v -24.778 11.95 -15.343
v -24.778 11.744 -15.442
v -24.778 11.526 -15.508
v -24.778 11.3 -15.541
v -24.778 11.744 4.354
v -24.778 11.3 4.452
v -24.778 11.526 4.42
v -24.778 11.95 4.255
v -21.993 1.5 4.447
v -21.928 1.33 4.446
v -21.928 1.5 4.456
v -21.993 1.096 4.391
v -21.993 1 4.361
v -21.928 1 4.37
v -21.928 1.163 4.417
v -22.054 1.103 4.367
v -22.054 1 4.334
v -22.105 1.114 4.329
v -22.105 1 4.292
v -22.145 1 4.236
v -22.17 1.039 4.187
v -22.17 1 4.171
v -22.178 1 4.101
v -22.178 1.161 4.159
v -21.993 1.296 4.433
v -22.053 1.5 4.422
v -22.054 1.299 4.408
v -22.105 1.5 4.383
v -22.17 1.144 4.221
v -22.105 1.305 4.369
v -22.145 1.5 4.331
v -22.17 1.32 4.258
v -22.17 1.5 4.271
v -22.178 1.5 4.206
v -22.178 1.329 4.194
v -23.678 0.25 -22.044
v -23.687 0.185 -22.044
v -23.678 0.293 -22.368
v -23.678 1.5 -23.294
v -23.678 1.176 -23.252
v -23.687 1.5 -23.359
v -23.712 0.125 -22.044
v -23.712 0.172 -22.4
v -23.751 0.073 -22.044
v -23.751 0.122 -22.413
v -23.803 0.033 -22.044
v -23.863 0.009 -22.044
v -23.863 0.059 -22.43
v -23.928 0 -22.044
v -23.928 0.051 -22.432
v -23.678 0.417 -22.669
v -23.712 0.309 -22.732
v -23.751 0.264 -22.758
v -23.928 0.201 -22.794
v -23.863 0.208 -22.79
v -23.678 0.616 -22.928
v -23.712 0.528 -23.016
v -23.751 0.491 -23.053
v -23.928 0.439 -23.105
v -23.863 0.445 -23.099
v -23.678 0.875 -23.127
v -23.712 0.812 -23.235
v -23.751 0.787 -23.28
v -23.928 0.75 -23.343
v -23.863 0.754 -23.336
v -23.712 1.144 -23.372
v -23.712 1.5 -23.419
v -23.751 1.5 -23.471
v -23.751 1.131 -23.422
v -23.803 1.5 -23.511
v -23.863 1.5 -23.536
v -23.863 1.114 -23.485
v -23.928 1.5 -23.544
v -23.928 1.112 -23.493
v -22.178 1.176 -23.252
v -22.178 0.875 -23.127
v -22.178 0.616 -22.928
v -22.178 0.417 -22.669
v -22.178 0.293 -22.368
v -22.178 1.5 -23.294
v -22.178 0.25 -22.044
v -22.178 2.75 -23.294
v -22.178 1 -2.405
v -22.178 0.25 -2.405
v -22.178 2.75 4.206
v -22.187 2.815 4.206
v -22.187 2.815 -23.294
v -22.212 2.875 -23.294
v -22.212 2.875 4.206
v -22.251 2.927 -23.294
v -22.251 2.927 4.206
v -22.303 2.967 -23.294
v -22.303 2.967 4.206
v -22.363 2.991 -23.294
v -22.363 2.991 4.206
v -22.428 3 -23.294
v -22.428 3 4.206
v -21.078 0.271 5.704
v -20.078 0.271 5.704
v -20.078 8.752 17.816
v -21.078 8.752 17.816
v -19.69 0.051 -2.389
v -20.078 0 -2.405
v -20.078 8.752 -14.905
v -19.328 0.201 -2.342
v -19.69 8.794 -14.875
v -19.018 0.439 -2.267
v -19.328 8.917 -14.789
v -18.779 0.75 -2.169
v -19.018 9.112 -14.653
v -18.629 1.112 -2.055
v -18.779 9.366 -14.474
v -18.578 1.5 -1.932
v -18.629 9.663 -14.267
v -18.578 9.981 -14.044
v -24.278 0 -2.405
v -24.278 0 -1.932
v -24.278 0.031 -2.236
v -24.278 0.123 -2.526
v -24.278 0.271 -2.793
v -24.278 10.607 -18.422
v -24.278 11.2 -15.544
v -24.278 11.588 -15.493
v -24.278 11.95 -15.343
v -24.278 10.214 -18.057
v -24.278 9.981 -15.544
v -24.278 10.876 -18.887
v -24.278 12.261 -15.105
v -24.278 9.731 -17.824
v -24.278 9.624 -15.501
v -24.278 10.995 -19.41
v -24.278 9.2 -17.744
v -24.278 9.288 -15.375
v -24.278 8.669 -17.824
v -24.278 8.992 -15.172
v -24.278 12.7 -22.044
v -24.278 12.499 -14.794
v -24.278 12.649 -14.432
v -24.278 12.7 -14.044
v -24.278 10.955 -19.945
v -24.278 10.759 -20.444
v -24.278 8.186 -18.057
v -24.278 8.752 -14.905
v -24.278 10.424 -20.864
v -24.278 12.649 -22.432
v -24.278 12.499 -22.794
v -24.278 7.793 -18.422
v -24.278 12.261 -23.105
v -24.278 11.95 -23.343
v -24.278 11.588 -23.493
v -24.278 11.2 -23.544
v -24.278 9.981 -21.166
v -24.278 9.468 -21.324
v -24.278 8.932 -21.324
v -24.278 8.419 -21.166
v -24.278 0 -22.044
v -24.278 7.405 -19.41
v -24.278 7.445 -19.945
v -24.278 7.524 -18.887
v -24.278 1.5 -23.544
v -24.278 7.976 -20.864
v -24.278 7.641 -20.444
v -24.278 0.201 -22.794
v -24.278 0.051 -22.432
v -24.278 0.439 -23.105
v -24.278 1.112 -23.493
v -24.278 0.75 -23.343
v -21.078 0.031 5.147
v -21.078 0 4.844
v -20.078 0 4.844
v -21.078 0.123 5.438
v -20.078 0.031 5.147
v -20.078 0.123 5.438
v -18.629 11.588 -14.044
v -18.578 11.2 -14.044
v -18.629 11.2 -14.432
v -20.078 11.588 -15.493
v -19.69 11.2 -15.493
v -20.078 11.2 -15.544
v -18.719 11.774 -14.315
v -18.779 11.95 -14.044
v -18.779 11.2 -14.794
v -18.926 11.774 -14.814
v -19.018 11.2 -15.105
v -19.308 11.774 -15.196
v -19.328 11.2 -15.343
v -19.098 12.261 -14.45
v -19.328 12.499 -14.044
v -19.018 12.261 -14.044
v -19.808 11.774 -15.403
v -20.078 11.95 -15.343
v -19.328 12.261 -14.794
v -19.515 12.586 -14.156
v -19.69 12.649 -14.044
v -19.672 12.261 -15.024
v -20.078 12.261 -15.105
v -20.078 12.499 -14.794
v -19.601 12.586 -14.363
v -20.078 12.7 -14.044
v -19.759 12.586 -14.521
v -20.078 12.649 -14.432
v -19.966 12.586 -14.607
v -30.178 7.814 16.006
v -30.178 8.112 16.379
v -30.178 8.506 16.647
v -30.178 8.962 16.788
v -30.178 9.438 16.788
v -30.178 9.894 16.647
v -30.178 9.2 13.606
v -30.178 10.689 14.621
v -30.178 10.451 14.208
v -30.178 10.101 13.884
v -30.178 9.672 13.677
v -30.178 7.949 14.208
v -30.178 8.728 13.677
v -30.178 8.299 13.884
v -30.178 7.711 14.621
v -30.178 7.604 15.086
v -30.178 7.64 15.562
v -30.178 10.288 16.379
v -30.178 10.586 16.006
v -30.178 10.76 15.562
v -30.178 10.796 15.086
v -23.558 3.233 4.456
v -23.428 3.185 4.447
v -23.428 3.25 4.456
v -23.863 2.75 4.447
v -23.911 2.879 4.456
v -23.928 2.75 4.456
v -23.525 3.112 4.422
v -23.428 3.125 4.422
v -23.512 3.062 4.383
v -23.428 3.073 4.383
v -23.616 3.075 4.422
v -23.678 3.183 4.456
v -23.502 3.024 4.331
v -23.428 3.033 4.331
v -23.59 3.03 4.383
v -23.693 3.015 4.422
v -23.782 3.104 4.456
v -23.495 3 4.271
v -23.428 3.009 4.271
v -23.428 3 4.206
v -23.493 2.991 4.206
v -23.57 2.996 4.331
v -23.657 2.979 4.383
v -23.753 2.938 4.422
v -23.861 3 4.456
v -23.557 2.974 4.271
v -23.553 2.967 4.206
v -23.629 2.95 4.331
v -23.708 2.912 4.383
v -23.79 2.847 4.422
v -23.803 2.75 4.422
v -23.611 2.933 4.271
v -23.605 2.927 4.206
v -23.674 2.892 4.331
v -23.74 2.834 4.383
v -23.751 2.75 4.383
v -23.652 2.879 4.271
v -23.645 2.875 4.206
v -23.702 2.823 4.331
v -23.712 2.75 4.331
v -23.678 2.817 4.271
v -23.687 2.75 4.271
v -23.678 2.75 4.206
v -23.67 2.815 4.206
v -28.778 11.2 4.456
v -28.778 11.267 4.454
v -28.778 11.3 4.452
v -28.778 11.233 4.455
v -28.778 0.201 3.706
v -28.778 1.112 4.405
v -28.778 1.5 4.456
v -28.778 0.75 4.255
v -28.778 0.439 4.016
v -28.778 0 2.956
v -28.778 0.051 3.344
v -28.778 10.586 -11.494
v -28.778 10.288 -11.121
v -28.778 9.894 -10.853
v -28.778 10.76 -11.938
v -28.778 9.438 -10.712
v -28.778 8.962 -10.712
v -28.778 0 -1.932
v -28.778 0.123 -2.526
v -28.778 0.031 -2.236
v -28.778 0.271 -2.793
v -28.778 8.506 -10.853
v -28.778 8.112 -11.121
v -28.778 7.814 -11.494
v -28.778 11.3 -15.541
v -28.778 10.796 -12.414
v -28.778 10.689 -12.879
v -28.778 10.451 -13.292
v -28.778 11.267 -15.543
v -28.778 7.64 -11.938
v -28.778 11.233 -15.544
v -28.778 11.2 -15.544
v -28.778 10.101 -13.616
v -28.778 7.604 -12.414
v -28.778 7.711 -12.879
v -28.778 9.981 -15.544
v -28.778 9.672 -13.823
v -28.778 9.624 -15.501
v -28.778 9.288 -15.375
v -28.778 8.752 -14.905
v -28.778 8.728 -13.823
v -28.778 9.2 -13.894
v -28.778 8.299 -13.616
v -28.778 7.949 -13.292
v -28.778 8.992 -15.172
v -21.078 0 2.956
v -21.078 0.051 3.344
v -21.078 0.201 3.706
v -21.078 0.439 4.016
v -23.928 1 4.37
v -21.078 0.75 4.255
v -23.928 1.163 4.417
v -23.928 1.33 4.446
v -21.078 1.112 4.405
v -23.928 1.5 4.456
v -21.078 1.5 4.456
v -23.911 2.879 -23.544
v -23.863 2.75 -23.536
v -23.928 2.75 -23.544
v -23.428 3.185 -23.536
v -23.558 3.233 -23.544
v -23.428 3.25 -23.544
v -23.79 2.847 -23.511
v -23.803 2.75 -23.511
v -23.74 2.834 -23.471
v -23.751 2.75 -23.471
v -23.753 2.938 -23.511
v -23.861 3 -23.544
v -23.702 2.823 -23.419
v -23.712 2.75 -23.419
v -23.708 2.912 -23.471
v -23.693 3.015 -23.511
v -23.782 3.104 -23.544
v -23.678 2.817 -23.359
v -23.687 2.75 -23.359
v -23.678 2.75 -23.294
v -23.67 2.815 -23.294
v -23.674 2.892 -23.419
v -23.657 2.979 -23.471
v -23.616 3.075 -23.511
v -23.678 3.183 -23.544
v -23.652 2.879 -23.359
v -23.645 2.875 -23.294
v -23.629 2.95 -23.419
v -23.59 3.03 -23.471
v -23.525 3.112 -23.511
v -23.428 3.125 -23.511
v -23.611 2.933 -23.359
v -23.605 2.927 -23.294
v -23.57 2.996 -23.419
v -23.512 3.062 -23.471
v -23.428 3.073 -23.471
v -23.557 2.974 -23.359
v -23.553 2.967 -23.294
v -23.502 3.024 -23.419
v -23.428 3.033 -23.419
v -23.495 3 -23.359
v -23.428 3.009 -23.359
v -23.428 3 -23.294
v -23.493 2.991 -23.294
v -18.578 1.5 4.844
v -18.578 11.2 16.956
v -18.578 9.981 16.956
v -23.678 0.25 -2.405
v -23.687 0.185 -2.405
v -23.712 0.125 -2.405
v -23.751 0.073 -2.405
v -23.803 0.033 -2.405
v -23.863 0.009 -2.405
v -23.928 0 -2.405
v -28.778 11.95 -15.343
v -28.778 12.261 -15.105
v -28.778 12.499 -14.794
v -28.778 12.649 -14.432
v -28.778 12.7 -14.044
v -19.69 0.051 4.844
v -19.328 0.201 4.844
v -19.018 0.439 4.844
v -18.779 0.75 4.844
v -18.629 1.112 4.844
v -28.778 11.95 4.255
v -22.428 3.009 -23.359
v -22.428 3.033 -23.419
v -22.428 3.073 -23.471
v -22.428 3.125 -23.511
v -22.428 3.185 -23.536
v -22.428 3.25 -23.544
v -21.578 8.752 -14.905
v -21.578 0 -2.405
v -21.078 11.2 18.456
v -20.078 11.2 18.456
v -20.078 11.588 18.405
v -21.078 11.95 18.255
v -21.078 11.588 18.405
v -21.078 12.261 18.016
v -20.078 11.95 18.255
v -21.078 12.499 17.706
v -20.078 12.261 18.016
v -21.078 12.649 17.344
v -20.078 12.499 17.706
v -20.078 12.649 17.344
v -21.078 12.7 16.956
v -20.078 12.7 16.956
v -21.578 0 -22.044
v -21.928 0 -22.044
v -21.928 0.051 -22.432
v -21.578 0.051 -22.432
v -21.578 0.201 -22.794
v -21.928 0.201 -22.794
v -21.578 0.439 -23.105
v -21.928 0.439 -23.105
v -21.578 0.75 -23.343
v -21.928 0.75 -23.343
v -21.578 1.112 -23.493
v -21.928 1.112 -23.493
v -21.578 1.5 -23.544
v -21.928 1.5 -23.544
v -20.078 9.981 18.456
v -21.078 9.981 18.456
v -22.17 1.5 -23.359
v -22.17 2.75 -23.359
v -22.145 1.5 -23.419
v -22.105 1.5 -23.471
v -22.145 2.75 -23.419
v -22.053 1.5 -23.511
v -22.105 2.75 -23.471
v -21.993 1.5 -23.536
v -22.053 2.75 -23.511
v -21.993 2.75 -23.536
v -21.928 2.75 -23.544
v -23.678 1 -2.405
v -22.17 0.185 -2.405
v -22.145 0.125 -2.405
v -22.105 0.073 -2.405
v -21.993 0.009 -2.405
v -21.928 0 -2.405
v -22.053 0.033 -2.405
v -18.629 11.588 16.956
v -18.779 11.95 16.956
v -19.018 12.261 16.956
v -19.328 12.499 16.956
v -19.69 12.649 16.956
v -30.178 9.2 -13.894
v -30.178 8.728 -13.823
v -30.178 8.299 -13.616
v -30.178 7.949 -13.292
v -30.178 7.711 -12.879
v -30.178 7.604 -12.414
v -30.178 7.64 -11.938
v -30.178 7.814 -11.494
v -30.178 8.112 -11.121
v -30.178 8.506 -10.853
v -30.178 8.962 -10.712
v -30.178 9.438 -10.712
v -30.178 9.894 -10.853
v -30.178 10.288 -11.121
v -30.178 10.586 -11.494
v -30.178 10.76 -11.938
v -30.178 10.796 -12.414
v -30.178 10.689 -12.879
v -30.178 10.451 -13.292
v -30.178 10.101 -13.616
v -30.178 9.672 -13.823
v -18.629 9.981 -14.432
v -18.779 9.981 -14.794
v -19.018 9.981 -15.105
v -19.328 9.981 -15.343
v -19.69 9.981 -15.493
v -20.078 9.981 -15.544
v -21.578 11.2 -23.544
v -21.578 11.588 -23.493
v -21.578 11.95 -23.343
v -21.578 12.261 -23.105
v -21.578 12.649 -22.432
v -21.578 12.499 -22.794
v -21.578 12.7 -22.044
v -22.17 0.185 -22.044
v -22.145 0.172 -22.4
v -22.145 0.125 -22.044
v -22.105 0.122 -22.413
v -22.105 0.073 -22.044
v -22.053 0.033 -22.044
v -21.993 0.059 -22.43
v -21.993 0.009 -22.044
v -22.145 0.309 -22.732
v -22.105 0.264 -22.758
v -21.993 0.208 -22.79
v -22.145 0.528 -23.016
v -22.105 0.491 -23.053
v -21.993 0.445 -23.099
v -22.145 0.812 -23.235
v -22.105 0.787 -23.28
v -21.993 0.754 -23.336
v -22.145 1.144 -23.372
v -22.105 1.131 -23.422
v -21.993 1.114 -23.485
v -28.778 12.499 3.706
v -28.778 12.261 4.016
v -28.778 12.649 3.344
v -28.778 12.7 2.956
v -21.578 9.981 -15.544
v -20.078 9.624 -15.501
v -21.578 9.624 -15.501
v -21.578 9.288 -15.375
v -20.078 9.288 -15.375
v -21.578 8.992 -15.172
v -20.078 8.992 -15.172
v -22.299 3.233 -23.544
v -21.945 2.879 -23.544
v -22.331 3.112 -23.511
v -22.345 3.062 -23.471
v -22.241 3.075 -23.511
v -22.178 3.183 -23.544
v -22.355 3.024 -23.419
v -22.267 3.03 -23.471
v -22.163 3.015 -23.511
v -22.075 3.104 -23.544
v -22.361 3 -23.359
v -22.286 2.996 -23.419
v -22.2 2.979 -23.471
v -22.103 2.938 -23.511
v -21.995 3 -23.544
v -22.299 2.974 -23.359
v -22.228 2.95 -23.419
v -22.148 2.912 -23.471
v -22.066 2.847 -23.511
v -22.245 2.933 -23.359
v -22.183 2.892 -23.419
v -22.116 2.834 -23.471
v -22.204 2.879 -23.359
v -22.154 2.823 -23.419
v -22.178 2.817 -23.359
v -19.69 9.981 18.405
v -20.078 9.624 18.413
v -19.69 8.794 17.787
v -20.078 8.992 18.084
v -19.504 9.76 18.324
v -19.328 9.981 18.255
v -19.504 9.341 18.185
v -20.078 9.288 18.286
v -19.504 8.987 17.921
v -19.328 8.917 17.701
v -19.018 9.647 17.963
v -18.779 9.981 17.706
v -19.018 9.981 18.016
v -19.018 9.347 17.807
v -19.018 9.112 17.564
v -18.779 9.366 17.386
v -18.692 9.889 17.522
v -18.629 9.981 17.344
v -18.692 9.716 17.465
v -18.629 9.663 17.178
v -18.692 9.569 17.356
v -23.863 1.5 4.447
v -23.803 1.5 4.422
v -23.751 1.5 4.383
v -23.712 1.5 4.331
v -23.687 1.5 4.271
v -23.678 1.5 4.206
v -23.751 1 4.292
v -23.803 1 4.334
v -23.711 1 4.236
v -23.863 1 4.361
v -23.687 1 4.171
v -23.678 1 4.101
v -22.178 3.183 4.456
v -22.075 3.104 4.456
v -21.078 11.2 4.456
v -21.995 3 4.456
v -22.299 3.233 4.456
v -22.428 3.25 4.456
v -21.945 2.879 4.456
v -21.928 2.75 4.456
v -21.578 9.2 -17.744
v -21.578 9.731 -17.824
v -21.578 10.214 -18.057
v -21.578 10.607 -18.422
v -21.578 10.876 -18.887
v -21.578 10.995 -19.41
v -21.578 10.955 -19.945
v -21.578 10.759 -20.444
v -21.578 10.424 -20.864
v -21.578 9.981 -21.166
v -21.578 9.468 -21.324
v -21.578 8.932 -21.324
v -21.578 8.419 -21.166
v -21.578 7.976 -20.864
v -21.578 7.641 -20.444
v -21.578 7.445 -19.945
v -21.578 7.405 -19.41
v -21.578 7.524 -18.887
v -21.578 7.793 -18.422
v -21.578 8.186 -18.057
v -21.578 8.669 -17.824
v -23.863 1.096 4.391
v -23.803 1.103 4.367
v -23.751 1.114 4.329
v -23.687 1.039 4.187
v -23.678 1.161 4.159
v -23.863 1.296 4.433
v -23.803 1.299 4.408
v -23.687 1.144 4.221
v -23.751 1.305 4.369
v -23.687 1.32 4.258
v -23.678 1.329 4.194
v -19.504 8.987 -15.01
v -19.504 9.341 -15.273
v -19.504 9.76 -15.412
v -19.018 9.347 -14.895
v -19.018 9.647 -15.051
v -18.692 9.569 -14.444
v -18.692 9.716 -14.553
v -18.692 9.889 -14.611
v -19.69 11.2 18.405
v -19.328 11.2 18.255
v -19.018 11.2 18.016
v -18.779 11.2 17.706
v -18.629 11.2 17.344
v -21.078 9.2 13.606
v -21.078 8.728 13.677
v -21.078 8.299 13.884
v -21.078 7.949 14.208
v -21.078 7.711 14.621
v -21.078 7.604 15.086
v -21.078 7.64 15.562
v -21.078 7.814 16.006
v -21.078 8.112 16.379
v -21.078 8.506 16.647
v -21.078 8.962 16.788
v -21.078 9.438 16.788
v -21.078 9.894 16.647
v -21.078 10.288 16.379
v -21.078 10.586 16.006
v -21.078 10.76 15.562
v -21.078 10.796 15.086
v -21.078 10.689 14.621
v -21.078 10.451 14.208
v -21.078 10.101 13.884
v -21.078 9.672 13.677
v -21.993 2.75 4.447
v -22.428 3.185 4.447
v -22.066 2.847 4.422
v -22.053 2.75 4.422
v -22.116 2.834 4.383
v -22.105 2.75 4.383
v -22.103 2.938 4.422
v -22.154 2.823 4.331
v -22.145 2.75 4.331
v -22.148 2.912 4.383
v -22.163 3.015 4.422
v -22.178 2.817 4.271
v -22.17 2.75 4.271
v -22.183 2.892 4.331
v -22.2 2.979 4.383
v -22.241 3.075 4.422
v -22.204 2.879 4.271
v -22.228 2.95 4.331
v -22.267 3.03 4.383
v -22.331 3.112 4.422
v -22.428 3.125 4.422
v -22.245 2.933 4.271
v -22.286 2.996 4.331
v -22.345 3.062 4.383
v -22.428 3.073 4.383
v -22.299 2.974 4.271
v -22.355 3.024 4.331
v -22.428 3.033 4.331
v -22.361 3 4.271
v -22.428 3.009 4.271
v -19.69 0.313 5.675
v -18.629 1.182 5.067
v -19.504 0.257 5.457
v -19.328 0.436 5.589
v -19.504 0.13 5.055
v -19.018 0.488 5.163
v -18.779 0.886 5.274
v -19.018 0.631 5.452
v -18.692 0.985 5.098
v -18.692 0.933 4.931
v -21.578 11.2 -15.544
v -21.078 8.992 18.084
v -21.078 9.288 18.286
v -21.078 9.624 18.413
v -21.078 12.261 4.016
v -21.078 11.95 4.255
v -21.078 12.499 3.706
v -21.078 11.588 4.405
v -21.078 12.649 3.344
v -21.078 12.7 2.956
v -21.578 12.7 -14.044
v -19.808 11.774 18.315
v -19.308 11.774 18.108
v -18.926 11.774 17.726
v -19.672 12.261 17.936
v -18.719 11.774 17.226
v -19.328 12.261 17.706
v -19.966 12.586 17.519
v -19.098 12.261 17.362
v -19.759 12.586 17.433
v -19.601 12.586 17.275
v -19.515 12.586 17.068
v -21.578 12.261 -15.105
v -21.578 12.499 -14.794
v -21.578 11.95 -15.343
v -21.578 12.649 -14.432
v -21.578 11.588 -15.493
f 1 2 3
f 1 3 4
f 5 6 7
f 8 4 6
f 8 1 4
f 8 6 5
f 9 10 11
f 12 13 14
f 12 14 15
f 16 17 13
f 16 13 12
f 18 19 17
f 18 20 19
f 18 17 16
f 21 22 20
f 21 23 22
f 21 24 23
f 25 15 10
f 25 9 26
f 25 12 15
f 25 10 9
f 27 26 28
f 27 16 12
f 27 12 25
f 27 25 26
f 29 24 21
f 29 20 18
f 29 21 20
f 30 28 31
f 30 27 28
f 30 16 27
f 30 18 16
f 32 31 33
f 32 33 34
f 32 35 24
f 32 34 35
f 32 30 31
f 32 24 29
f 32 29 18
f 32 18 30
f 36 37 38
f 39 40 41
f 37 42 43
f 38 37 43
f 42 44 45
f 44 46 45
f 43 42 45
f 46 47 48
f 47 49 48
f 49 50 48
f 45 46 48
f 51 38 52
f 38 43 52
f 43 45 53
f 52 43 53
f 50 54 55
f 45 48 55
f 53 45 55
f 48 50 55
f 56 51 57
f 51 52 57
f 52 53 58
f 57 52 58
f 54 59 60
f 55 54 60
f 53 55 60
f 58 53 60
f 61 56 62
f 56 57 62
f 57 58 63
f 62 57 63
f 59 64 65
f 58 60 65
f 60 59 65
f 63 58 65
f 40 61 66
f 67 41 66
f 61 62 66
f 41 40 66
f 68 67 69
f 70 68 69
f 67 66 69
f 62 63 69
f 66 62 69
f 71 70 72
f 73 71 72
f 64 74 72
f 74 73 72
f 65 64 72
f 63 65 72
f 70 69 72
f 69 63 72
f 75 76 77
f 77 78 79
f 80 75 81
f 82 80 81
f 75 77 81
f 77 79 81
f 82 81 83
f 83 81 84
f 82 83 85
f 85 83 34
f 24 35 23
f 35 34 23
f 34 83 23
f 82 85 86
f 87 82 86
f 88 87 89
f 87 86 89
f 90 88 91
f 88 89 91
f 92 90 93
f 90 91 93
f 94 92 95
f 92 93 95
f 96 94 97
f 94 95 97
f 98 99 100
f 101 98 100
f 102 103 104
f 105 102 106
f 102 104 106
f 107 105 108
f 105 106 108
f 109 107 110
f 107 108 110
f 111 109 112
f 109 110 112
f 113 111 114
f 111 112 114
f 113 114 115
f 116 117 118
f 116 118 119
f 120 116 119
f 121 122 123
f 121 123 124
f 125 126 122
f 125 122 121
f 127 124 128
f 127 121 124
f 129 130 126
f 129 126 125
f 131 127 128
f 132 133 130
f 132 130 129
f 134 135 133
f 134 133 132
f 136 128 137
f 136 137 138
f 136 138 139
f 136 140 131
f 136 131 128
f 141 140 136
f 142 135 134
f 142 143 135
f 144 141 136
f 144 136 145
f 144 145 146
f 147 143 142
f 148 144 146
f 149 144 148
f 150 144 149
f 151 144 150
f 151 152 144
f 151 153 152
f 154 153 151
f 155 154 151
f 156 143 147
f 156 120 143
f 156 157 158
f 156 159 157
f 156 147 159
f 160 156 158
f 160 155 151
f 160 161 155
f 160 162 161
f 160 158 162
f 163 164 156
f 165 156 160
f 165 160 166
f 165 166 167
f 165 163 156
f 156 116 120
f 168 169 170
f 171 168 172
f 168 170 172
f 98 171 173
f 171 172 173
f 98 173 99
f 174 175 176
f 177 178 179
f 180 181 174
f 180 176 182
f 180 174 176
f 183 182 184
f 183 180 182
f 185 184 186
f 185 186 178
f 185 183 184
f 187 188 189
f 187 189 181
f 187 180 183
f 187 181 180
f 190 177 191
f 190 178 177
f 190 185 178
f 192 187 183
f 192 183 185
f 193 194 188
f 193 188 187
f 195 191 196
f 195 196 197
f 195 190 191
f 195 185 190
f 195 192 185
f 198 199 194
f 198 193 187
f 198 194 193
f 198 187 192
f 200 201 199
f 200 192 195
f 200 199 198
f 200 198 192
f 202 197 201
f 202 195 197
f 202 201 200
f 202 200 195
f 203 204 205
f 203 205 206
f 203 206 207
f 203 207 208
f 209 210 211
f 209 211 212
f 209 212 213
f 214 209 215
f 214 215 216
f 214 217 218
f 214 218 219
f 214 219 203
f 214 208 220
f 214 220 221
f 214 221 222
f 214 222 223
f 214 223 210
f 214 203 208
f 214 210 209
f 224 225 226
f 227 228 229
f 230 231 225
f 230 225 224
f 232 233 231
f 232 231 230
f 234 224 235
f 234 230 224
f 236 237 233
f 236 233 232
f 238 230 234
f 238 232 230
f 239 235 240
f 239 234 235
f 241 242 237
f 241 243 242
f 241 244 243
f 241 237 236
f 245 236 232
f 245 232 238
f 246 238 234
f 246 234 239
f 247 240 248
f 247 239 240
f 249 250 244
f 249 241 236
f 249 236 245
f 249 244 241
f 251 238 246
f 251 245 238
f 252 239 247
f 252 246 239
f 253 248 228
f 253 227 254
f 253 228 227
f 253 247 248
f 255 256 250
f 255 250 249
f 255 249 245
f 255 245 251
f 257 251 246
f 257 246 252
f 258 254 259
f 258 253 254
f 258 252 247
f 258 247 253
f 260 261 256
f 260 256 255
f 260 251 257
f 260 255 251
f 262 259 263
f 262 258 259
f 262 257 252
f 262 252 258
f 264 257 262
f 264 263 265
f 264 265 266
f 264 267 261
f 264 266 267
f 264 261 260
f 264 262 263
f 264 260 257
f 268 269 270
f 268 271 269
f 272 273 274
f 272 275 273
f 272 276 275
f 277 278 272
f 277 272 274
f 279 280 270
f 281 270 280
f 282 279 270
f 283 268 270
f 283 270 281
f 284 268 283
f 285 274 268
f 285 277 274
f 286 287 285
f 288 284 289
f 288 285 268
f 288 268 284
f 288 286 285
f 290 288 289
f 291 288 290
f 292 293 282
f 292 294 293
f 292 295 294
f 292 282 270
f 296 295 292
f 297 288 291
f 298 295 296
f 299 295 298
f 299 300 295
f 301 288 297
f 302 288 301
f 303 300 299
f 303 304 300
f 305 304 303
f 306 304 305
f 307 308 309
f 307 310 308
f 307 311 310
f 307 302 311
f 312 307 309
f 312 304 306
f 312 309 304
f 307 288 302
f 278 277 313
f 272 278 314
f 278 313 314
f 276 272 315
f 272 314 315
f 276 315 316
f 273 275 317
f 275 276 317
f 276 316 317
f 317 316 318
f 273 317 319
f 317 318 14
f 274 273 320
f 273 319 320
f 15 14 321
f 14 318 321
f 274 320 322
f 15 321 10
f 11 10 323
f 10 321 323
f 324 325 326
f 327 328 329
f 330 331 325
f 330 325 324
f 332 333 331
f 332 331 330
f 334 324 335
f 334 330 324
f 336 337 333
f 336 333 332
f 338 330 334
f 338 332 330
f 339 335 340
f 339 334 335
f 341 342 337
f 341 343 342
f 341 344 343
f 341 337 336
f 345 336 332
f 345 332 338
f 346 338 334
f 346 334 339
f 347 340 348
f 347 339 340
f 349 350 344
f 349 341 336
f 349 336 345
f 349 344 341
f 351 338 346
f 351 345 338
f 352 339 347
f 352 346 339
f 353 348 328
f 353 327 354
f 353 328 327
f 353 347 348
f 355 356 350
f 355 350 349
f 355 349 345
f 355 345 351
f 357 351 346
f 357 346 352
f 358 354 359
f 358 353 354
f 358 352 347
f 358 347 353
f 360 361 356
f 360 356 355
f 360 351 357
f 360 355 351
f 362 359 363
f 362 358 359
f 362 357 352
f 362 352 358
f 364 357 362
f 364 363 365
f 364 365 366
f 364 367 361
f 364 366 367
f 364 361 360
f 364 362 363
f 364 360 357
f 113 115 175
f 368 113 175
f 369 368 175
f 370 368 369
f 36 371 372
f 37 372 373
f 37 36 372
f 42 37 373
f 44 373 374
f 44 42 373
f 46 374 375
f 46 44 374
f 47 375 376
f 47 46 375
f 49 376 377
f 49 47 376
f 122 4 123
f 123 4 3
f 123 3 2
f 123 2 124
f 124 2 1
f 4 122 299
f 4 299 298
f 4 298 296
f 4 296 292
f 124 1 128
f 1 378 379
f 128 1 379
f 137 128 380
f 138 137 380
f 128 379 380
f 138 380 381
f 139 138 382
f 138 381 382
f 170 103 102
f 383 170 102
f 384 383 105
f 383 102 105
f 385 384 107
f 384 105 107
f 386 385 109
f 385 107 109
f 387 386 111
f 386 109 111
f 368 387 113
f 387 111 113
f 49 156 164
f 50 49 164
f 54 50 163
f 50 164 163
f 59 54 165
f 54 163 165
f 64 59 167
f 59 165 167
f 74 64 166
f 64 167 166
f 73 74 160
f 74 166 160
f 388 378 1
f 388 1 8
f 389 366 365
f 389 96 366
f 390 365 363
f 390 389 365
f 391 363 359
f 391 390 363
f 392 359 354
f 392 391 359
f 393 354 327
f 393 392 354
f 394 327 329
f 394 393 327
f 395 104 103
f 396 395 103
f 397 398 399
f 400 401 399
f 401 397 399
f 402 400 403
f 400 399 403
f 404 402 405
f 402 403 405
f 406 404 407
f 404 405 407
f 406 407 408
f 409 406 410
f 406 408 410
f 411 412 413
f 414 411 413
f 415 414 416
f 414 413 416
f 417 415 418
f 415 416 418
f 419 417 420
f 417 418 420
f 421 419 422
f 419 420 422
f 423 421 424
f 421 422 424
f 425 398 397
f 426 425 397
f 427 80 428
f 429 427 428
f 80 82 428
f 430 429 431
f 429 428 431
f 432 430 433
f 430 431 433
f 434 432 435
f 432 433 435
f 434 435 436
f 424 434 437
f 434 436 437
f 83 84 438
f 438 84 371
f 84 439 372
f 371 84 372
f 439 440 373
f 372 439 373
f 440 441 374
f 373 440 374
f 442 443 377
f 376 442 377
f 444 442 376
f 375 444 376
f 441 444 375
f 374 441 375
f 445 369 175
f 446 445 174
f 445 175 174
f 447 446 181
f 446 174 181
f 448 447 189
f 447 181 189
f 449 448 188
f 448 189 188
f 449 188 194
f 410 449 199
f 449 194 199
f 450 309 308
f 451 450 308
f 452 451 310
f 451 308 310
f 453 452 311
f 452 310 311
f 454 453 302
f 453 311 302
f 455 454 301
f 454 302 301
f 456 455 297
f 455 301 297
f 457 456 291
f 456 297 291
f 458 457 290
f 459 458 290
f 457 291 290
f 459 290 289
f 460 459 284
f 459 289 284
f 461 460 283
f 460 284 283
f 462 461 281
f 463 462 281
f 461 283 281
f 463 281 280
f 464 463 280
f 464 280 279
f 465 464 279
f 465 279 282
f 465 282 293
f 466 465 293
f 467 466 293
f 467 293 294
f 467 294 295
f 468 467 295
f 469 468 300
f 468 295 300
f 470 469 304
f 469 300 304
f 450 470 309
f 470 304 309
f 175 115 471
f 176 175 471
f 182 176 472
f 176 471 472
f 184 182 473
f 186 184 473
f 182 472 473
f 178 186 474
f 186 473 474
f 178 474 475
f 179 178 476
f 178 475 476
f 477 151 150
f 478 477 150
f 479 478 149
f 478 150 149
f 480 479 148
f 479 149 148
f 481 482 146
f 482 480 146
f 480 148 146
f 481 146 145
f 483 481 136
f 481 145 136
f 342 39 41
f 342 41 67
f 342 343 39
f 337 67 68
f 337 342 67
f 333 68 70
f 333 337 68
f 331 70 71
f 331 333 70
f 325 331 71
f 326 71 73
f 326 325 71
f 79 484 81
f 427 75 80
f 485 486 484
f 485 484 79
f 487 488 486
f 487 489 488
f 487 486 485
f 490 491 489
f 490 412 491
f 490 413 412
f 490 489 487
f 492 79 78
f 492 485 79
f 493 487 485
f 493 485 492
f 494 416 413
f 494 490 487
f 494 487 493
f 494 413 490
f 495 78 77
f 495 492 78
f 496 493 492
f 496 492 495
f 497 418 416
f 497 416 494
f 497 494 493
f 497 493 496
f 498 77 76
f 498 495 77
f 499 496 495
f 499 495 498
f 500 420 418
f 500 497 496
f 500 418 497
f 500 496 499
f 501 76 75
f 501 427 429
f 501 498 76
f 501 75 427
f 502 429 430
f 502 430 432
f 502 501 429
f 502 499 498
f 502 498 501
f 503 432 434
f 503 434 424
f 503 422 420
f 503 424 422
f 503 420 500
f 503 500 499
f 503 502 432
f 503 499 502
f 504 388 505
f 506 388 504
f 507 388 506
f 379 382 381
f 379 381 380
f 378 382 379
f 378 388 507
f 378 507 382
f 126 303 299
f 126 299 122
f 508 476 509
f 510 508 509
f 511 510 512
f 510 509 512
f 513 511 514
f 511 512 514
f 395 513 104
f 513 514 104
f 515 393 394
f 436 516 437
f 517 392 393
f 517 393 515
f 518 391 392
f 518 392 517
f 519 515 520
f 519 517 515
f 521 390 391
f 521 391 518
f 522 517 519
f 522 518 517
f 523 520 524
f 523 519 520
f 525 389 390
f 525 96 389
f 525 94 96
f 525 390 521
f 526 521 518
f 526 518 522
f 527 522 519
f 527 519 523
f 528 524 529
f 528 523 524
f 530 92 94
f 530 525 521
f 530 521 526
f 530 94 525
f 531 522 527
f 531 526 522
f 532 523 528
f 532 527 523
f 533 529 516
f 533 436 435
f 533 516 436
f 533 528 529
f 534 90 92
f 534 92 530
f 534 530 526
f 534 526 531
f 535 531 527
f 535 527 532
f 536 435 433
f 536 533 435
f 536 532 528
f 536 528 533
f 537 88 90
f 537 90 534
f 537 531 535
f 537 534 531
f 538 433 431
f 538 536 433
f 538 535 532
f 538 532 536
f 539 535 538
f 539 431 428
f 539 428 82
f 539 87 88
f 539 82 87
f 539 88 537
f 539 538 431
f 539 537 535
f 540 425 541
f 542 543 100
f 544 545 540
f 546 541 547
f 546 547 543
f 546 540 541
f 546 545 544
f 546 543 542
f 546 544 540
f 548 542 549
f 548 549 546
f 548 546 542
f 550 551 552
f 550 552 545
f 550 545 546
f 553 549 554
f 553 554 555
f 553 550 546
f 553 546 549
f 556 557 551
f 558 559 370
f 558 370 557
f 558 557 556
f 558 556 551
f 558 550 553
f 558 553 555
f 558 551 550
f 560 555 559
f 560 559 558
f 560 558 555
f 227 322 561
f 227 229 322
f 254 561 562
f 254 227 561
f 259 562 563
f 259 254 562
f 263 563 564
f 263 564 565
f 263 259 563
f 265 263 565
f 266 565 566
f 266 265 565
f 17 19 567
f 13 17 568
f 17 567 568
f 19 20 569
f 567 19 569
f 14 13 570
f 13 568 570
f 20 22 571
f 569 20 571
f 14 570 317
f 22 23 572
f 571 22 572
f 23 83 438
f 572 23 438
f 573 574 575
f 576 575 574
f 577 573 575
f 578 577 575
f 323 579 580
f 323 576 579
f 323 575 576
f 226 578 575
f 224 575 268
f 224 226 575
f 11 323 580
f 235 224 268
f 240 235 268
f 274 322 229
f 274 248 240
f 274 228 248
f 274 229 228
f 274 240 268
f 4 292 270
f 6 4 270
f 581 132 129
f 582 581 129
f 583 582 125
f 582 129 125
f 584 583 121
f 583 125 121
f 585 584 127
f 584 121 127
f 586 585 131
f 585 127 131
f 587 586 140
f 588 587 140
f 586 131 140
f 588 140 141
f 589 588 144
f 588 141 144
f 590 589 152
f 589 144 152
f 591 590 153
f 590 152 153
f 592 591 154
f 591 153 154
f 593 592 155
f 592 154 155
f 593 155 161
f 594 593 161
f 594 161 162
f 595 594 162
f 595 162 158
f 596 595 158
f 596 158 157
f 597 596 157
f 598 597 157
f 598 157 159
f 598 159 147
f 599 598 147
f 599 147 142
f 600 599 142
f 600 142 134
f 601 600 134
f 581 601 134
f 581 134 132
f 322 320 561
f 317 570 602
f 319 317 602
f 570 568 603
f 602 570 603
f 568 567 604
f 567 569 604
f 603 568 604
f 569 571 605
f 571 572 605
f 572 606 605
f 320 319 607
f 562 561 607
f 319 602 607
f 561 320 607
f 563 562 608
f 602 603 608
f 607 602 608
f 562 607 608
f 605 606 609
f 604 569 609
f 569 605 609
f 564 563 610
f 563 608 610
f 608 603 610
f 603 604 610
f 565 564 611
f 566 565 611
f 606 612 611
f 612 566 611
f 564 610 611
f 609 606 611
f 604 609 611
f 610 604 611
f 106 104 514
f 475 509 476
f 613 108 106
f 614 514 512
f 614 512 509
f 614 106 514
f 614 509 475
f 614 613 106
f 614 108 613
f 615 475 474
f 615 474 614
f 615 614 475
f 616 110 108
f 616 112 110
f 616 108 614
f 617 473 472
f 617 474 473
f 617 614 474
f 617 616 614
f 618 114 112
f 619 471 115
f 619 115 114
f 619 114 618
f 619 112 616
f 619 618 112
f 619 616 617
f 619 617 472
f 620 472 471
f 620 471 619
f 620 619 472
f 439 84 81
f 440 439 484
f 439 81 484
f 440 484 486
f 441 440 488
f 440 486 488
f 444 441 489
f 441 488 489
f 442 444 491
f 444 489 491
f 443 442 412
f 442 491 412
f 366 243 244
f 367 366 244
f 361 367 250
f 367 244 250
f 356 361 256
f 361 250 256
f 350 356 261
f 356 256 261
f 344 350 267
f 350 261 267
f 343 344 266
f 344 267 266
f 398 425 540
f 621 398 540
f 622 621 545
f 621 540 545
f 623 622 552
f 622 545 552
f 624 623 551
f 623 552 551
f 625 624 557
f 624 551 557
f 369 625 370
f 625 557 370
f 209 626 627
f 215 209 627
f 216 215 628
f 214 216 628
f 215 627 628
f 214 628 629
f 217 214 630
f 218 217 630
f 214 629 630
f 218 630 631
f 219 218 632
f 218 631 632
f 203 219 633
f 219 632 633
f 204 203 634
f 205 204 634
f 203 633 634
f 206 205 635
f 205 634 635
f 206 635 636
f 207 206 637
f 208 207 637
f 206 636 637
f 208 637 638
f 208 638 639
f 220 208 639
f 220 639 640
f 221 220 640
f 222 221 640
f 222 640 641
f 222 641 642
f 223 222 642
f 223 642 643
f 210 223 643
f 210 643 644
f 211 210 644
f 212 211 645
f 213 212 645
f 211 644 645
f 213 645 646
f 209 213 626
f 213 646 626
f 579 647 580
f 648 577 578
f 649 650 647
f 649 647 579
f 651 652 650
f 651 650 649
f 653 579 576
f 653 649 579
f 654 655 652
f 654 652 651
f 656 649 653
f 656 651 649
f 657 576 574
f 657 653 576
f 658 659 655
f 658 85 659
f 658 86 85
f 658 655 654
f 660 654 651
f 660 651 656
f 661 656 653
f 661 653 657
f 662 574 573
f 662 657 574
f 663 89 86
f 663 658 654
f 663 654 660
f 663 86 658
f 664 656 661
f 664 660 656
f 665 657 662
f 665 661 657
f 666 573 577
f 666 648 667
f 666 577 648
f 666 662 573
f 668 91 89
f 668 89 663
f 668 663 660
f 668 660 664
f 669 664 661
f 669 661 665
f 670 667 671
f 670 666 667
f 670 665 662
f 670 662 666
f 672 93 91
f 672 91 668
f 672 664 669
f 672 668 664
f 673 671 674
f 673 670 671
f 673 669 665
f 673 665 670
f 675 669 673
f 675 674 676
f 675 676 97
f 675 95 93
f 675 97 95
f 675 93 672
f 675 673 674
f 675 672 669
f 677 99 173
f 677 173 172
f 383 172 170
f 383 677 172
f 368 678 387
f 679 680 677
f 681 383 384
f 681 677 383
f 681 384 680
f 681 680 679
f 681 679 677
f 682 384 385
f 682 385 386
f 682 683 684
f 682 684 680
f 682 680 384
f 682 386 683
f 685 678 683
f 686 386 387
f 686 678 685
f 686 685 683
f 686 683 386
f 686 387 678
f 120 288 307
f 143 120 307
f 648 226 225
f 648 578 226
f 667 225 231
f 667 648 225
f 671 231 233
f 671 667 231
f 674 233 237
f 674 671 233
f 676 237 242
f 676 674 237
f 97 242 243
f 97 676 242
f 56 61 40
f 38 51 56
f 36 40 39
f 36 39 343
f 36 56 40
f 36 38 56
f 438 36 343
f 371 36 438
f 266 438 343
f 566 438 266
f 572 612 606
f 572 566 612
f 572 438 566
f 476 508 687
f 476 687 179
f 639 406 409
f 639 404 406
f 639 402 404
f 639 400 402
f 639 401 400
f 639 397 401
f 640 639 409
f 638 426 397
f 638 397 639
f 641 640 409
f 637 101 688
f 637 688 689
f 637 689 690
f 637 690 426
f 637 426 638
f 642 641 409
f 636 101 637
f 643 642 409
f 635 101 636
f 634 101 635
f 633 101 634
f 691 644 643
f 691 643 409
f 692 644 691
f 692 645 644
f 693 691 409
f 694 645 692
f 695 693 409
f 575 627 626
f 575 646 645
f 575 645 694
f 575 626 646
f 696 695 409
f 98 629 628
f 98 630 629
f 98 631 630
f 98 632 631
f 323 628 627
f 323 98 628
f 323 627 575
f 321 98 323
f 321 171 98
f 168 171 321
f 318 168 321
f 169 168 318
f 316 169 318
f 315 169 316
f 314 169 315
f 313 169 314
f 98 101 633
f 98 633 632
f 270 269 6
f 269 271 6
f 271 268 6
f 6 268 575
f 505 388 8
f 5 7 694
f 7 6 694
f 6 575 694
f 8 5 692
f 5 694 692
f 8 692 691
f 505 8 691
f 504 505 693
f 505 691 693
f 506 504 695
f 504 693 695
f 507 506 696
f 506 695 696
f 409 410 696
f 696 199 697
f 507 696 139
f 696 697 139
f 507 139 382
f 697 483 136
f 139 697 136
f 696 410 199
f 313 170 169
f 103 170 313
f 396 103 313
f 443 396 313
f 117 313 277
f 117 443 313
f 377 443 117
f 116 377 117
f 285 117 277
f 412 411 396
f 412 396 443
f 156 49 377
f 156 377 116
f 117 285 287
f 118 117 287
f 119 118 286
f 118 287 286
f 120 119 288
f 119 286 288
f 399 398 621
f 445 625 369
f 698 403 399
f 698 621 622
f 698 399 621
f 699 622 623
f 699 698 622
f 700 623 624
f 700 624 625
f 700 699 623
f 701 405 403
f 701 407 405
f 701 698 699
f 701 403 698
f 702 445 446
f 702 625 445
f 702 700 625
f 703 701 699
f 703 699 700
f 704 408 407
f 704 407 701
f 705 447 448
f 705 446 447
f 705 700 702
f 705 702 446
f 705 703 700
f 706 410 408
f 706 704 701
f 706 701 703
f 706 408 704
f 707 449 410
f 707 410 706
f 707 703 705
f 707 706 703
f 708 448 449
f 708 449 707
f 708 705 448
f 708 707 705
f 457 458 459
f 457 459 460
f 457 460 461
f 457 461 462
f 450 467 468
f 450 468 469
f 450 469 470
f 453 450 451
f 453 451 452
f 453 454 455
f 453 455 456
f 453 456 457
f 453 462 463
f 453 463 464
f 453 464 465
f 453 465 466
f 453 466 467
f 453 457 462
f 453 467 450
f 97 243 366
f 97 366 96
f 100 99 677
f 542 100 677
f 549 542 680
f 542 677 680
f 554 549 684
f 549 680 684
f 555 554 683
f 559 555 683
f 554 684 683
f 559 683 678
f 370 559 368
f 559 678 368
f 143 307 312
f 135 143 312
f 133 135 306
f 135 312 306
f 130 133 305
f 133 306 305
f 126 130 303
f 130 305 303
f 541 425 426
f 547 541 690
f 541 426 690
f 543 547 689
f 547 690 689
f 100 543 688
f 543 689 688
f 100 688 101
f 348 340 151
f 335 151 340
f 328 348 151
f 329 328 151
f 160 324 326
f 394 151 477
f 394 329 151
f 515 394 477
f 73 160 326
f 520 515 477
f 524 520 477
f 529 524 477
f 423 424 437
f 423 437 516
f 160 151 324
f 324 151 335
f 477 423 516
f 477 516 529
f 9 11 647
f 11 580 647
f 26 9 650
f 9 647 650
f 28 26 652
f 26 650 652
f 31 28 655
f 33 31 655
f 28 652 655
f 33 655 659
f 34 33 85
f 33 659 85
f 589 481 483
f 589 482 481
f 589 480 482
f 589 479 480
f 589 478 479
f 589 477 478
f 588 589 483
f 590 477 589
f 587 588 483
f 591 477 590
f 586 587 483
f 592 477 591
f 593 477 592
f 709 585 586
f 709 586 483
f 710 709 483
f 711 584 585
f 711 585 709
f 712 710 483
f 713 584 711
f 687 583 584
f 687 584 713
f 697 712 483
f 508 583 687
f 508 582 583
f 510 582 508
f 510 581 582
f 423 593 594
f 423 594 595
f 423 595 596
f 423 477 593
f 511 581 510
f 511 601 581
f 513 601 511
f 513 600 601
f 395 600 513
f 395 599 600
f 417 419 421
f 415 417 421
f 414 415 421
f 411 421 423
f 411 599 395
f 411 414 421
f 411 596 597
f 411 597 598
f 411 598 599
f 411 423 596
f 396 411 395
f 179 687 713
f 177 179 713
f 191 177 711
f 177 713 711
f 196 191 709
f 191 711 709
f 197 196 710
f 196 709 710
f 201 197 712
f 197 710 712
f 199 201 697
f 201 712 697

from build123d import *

# Parameters (mm, degrees)
BOSS_EXTRUDE1_DEPTH = 12.7
CUT_EXTRUDE2_DEPTH  = 4.5
CUT_EXTRUDE3_DEPTH  = 29.629690424
BOSS_EXTRUDE2_START = -7.7
SKETCH2_5_R         = 1.6
BOSS_EXTRUDE2_DEPTH = 9.1
SKETCH2_6_R         = 1.8
CUT_EXTRUDE4_DEPTH  = 29.629690424
SKETCH2_7_R         = 1.6
BOSS_EXTRUDE3_DEPTH = 1.4
SKETCH2_8_W         = 42
SKETCH2_8_H         = 0.65
CUT_EXTRUDE5_DEPTH  = 4
CUT_EXTRUDE6_REACH  = 31.158
SKETCH4_W           = 1.5
SKETCH4_H           = 28
CUT_EXTRUDE7_DEPTH  = 3
SKETCH6_W           = 2.1
SKETCH6_H           = 6.861038338
BOSS_EXTRUDE4_DEPTH = 1
CUT_EXTRUDE8_DEPTH  = 4.5
FILLET1_R           = 1.5
FILLET2_R           = 0.25


with BuildPart() as part:
    # Sketch1 → Boss-Extrude1 (new body)
    with BuildSketch(Plane(origin=(0, 0, 0), x_dir=(1, 0, 0), z_dir=(0, 1, 0))):
        Polygon((-28.77817965, 15.54419618), (-24.27817965, 15.54419618), (-24.27817965, 23.54419618), (-21.57817965, 23.54419618), (-21.57817965, 15.54419618), (-18.57817965, 15.54419618), (-18.57817965, -18.45580382), (-21.07817965, -18.45580382), (-21.07817965, -4.45580382), (-28.77817965, -4.45580382), align=None)
    extrude(amount=BOSS_EXTRUDE1_DEPTH)

    # Sketch2 → Cut-Extrude2 (cut)
    with BuildSketch(Plane.ZY.offset(28.77817965)):
        Polygon((-15.54419618, 5.764870839), (-15.54419618, 0), (-7.040359819, 0), align=None)
    extrude(amount=-CUT_EXTRUDE2_DEPTH, mode=Mode.SUBTRACT)

    # Sketch2<4> → Cut-Extrude3 (cut, through all)
    with BuildSketch(Plane.ZY.offset(28.77817965)):
        Polygon((12.124702683, 0), (18.45580382, 0), (18.45580382, 9.2), align=None)
    extrude(amount=-CUT_EXTRUDE3_DEPTH, mode=Mode.SUBTRACT)

    # Sketch2<5> → Boss-Extrude2 (add)
    with BuildSketch(Plane.ZY.offset(28.77817965).offset(BOSS_EXTRUDE2_START)):
        with Locations(Location((15.20580382, 9.2, 0), (0, 0, 180))):
            Circle(SKETCH2_5_R)
    extrude(amount=BOSS_EXTRUDE2_DEPTH)

    # Sketch2<6> → Cut-Extrude4 (cut, through all)
    with BuildSketch(Plane.ZY.offset(28.77817965)):
        with Locations((-19.54419618, 9.2)):
            Circle(SKETCH2_6_R)
    extrude(amount=-CUT_EXTRUDE4_DEPTH, mode=Mode.SUBTRACT)

    # Sketch2<7> → Boss-Extrude3 (add)
    with BuildSketch(Plane.ZY.offset(28.77817965)):
        with Locations(Location((-12.29419618, 9.2, 0), (0, 0, 180))):
            Circle(SKETCH2_7_R)
    extrude(amount=BOSS_EXTRUDE3_DEPTH)

    # Sketch2<8> → Cut-Extrude5 (cut)
    with BuildSketch(Plane.ZY.offset(28.77817965)):
        with Locations((-2.54419618, 11.625)):
            Rectangle(SKETCH2_8_W, SKETCH2_8_H)
    extrude(amount=-CUT_EXTRUDE5_DEPTH, mode=Mode.SUBTRACT)

    # Cut-Extrude6: up to this face of the body (flat: up to its plane)
    cut_extrude6_end = Plane(part.part.faces().sort_by_distance((-21.57817965, 6.032683514, -19.54419618))[0])
    # Sketch3 → Cut-Extrude6 (cut, up to the picked face)
    with BuildSketch(Plane(origin=(-18.57817965, 0, 0), x_dir=(0, 0, -1), z_dir=(1, 0, 0)), mode=Mode.PRIVATE) as cut_extrude6_sk1:
        Polygon((15.54419618, 0), (15.54419618, 9.2), (2.405234518, 0), align=None)
    cut_extrude6_tool1 = split(extrude(cut_extrude6_sk1.sketch, amount=-CUT_EXTRUDE6_REACH, mode=Mode.PRIVATE), bisect_by=cut_extrude6_end, keep=Keep.BOTH, mode=Mode.PRIVATE)
    # Sketch3 → Cut-Extrude6 (cut, up to the picked face)
    with BuildSketch(Plane(origin=(-18.57817965, 0, 0), x_dir=(0, 0, -1), z_dir=(1, 0, 0)), mode=Mode.PRIVATE) as cut_extrude6_sk2:
        Polygon((-12.124702683, 0), (-18.45580382, 9.2), (-18.45580382, 0), align=None)
    cut_extrude6_tool2 = split(extrude(cut_extrude6_sk2.sketch, amount=-CUT_EXTRUDE6_REACH, mode=Mode.PRIVATE), bisect_by=cut_extrude6_end, keep=Keep.BOTH, mode=Mode.PRIVATE)
    # Sketch3 → Cut-Extrude6 (cut, up to the picked face)
    with BuildSketch(Plane(origin=(-18.57817965, 0, 0), x_dir=(0, 0, -1), z_dir=(1, 0, 0)), mode=Mode.PRIVATE) as cut_extrude6_sk3:
        Polygon((-5.316842158, 0), (-18.45580382, 9.2), (-12.124702683, 0), align=None)
    cut_extrude6_tool3 = split(extrude(cut_extrude6_sk3.sketch, amount=-CUT_EXTRUDE6_REACH, mode=Mode.PRIVATE), bisect_by=cut_extrude6_end, keep=Keep.BOTH, mode=Mode.PRIVATE)
    add(cut_extrude6_tool1.solids().sort_by(Axis((-18.57818, 3.066667, -11.164542), (-1, 0, 0)))[0], mode=Mode.SUBTRACT)
    add(cut_extrude6_tool2.solids().sort_by(Axis((-18.57818, 3.066667, 16.345437), (-1, 0, 0)))[0], mode=Mode.SUBTRACT)
    add(cut_extrude6_tool3.solids().sort_by(Axis((-18.57818, 3.066667, 11.965783), (-1, 0, 0)))[0], mode=Mode.SUBTRACT)

    # Sketch4 → Cut-Extrude7 (cut)
    with BuildSketch(Plane.XZ):
        with Locations((-22.92817965, -9.54419618)):
            Rectangle(SKETCH4_W, SKETCH4_H)
    extrude(amount=-CUT_EXTRUDE7_DEPTH, mode=Mode.SUBTRACT)

    # Sketch6 → Boss-Extrude4 (add)
    with BuildSketch(Plane(origin=(0, 0, 0), x_dir=(-1, 0, 0), z_dir=(0, -1, 0))):
        with Locations((22.62817965, -1.025284651)):
            Rectangle(SKETCH6_W, SKETCH6_H)
    extrude(amount=-BOSS_EXTRUDE4_DEPTH)

    # Sketch8 → Cut-Extrude8 (cut)
    with BuildSketch(Plane.ZY.offset(28.77817965)):
        Polygon((-15.54419618, 0), (-7.040359819, 0), (-15.54419618, 5.764870839), align=None)
        Polygon((-7.040359819, 0), (-2.405234518, 0), (-15.54419618, 9.2), (-15.54419618, 5.764870839), align=None)
    extrude(amount=-CUT_EXTRUDE8_DEPTH, mode=Mode.SUBTRACT)

    # Fillet1
    # the kernel refuses this fillet: 1.5 mm, written as the material it takes off along each edge
    with BuildSketch(Plane(origin=(-20.07817965, 9.980850576, 16.95580382), x_dir=(0, 0, 1), z_dir=(1, 0, 0))) as fillet1_piece_1_section:
        Polygon((0, 0), (FILLET1_R, 0), (FILLET1_R, FILLET1_R * 0.520567050552), (FILLET1_R * 0.573576436351, FILLET1_R * 0.819152044289), align=None)
    fillet1_piece_1 = extrude(amount=FILLET1_R, mode=Mode.PRIVATE)
    fillet1_piece_1 = fillet1_piece_1 - Plane(origin=(-20.07817965, 9.980850576, 16.95580382), x_dir=(0, 0.46174861323503175, -0.8870108331782229), z_dir=(1, 0, 0)) * Sphere(FILLET1_R, mode=Mode.PRIVATE)
    add(fillet1_piece_1, mode=Mode.SUBTRACT)
    with BuildSketch(Plane(origin=(-20.07817965, 11.2, 16.95580382), x_dir=(1, 0, 0), z_dir=(0, 1, 0))) as fillet1_piece_2_section:
        Polygon((0, 0), (FILLET1_R, 0), (FILLET1_R, -FILLET1_R), (0, -FILLET1_R), align=None)
    fillet1_piece_2 = extrude(amount=FILLET1_R, mode=Mode.PRIVATE)
    fillet1_piece_2 = fillet1_piece_2 - Plane(origin=(-20.07817965, 11.2, 16.95580382), x_dir=(-0.7071067811865476, 0, -0.7071067811865474), z_dir=(0, 1, 0)) * Sphere(FILLET1_R, mode=Mode.PRIVATE)
    add(fillet1_piece_2, mode=Mode.SUBTRACT)
    with BuildSketch(Plane(origin=(-20.07817965, 1.5, 4.843893974), x_dir=(0, -0.8191520442889889, 0.5735764363510503), z_dir=(1, 0, 0))) as fillet1_piece_3_section:
        Polygon((0, 0), (FILLET1_R, 0), (FILLET1_R, FILLET1_R * 0.315298788879), (FILLET1_R * 0.819152044289, FILLET1_R * 0.573576436351), align=None)
    fillet1_piece_3 = extrude(amount=FILLET1_R, mode=Mode.PRIVATE)
    fillet1_piece_3 = fillet1_piece_3 - Plane(origin=(-20.07817965, 1.5, 4.843893974), x_dir=(0, 0.9537169507482263, -0.30070579950427556), z_dir=(1, 0, 0)) * Sphere(FILLET1_R, mode=Mode.PRIVATE)
    add(fillet1_piece_3, mode=Mode.SUBTRACT)
    with BuildSketch(Plane(origin=(-20.07817965, 9.980850576, -14.04419618), x_dir=(0, 0, -1), z_dir=(1, 0, 0))) as fillet1_piece_4_section:
        Polygon((0, 0), (FILLET1_R, 0), (FILLET1_R, -FILLET1_R * 0.520567050552), (FILLET1_R * 0.573576436351, -FILLET1_R * 0.819152044289), align=None)
    fillet1_piece_4 = extrude(amount=FILLET1_R, mode=Mode.PRIVATE)
    fillet1_piece_4 = fillet1_piece_4 - Plane(origin=(-20.07817965, 9.980850576, -14.04419618), x_dir=(0, 0.4617486132350316, 0.8870108331782229), z_dir=(1, 0, 0)) * Sphere(FILLET1_R, mode=Mode.PRIVATE)
    add(fillet1_piece_4, mode=Mode.SUBTRACT)
    with BuildSketch(Plane(origin=(-20.07817965, 11.2, -14.04419618), x_dir=(1, 0, 0), z_dir=(0, 1, 0))) as fillet1_piece_5_section:
        Polygon((0, 0), (FILLET1_R, 0), (FILLET1_R, FILLET1_R), (0, FILLET1_R), align=None)
    fillet1_piece_5 = extrude(amount=FILLET1_R, mode=Mode.PRIVATE)
    fillet1_piece_5 = fillet1_piece_5 - Plane(origin=(-20.07817965, 11.2, -14.04419618), x_dir=(-0.7071067811865475, 0, 0.7071067811865477), z_dir=(0, 1, 0)) * Sphere(FILLET1_R, mode=Mode.PRIVATE)
    add(fillet1_piece_5, mode=Mode.SUBTRACT)
    with BuildSketch(Plane(origin=(-21.07817965, 0, 4.45580382), x_dir=(0, 1, 0), z_dir=(-1, 0, 0))) as fillet1_piece_6:
        with BuildLine():
            CenterArc((FILLET1_R, FILLET1_R), FILLET1_R, 180, 90)
            Line((0, FILLET1_R), (0, 0))
            Line((0, 0), (FILLET1_R, 0))
        make_face()
    extrude(amount=11.45, mode=Mode.SUBTRACT)
    with BuildSketch(Plane(origin=(-21.07817965, 12.7, 4.45580382), x_dir=(0, -1, 0), z_dir=(-1, 0, 0))) as fillet1_piece_7:
        with BuildLine():
            CenterArc((FILLET1_R, -FILLET1_R), FILLET1_R, 90, 90)
            Line((0, -FILLET1_R), (0, 0))
            Line((0, 0), (FILLET1_R, 0))
        make_face()
    extrude(amount=11.45, mode=Mode.SUBTRACT)
    with BuildSketch(Plane(origin=(-25.92817965, 0, -23.54419618), x_dir=(0, 1, 0), z_dir=(1, 0, 0)), Plane(origin=(-28.02817965, 0, -23.54419618), x_dir=(0, 1, 0), z_dir=(1, 0, 0))) as fillet1_piece_8:
        with BuildLine():
            CenterArc((FILLET1_R, FILLET1_R), FILLET1_R, 180, 90)
            Line((0, FILLET1_R), (0, 0))
            Line((0, 0), (FILLET1_R, 0))
        make_face()
    extrude(amount=8.1, mode=Mode.SUBTRACT)
    with BuildSketch(Plane(origin=(-28.02817965, 12.7, -23.54419618), x_dir=(0, -1, 0), z_dir=(1, 0, 0))) as fillet1_piece_9:
        with BuildLine():
            CenterArc((FILLET1_R, -FILLET1_R), FILLET1_R, 90, 90)
            Line((0, -FILLET1_R), (0, 0))
            Line((0, 0), (FILLET1_R, 0))
        make_face()
    extrude(amount=10.2, mode=Mode.SUBTRACT)
    with BuildSketch(Plane(origin=(-18.57817965, 9.980850576, 18.45580382), x_dir=(0, 0, -1), z_dir=(0, 1, 0))) as fillet1_piece_10:
        with BuildLine():
            CenterArc((FILLET1_R, FILLET1_R), FILLET1_R, 180, 90)
            Line((0, FILLET1_R), (0, 0))
            Line((0, 0), (FILLET1_R, 0))
        make_face()
    extrude(amount=1.219149424, mode=Mode.SUBTRACT)
    with BuildSketch(Plane(origin=(-23.03030609, 9.2, 18.45580382), x_dir=(0, 1, 0), z_dir=(1, 0, 0))) as fillet1_piece_11:
        with BuildLine():
            CenterArc((FILLET1_R * 0.520567050552, -FILLET1_R), FILLET1_R, 90, 55)
            Line((-FILLET1_R * 0.298584993737, -FILLET1_R * 0.426423563649), (0, 0))
            Line((0, 0), (FILLET1_R * 0.520567050552, 0))
        make_face()
    extrude(amount=2.95212644, mode=Mode.SUBTRACT)
    with BuildSketch(Plane(origin=(-20.07817965, 12.7, 18.45580382), x_dir=(0, -1, 0), z_dir=(-1, 0, 0))) as fillet1_piece_12:
        with BuildLine():
            CenterArc((FILLET1_R, -FILLET1_R), FILLET1_R, 90, 90)
            Line((0, -FILLET1_R), (0, 0))
            Line((0, 0), (FILLET1_R, 0))
        make_face()
    extrude(amount=4.75, mode=Mode.SUBTRACT)
    with BuildSketch(Plane(origin=(-20.07817965, 0, 5.316842158), x_dir=(0, 0.573576436351042, 0.8191520442889947), z_dir=(-1, 0, 0))) as fillet1_piece_13:
        with BuildLine():
            CenterArc((FILLET1_R * 0.315298788879, FILLET1_R), FILLET1_R, 235, 35)
            Line((-FILLET1_R * 0.258277647472, FILLET1_R * 0.180847955711), (0, 0))
            Line((0, 0), (FILLET1_R * 0.315298788879, 0))
        make_face()
    extrude(amount=2.182370458, mode=Mode.SUBTRACT)
    with BuildSketch(Plane(origin=(-18.57817965, 0.271271934, 5.704258629), x_dir=(2.3684757858670013e-15, 0.8191520442889889, -0.5735764363510503), z_dir=(0, 0.5735764363510503, 0.8191520442889889))) as fillet1_piece_14:
        with BuildLine():
            CenterArc((FILLET1_R, FILLET1_R), FILLET1_R, 180, 90)
            Line((0, FILLET1_R), (0, 0))
            Line((0, 0), (FILLET1_R, 0))
        make_face()
    extrude(amount=14.785911761, mode=Mode.SUBTRACT)
    with BuildSketch(Plane(origin=(-18.57817965, 0, -6.155234518), x_dir=(0, 1, 0), z_dir=(0, 0, 1))) as fillet1_piece_15:
        with BuildLine():
            CenterArc((FILLET1_R, FILLET1_R), FILLET1_R, 180, 90)
            Line((0, FILLET1_R), (0, 0))
            Line((0, 0), (FILLET1_R, 0))
        make_face()
    extrude(amount=10.999128493, mode=Mode.SUBTRACT)
    with BuildSketch(Plane(origin=(-18.57817965, 8.752122509, -14.904560835), x_dir=(-1, 0, 0), z_dir=(0, -0.5735764363510504, 0.8191520442889888))) as fillet1_piece_16:
        with BuildLine():
            CenterArc((FILLET1_R, -FILLET1_R), FILLET1_R, 90, 90)
            Line((0, -FILLET1_R), (0, 0))
            Line((0, 0), (FILLET1_R, 0))
        make_face()
    extrude(amount=19.008859944, mode=Mode.SUBTRACT)
    with BuildSketch(Plane(origin=(-20.07817965, 9.2, -15.54419618), x_dir=(0, -0.5735764363510506, 0.8191520442889886), z_dir=(-1, 0, 0))) as fillet1_piece_17:
        with BuildLine():
            CenterArc((FILLET1_R * 0.520567050552, FILLET1_R), FILLET1_R, 215, 55)
            Line((-FILLET1_R * 0.298584993737, FILLET1_R * 0.426423563649), (0, 0))
            Line((0, 0), (FILLET1_R * 0.520567050552, 0))
        make_face()
    extrude(amount=1.5, mode=Mode.SUBTRACT)
    with BuildSketch(Plane(origin=(-18.57817965, 9.980850576, -15.54419618), x_dir=(0, 0, 1), z_dir=(0, 1, 0))) as fillet1_piece_18:
        with BuildLine():
            CenterArc((FILLET1_R, -FILLET1_R), FILLET1_R, 90, 90)
            Line((0, -FILLET1_R), (0, 0))
            Line((0, 0), (FILLET1_R, 0))
        make_face()
    extrude(amount=1.219149424, mode=Mode.SUBTRACT)
    with BuildSketch(Plane(origin=(-32.52817965, 12.7, -15.54419618), x_dir=(0, 0, 1), z_dir=(1, 0, 0))) as fillet1_piece_19:
        with BuildLine():
            CenterArc((FILLET1_R, FILLET1_R), FILLET1_R, 180, 90)
            Line((0, FILLET1_R), (0, 0))
            Line((0, 0), (FILLET1_R, 0))
        make_face()
    extrude(amount=8.25, mode=Mode.SUBTRACT)
    with BuildSketch(Plane(origin=(-32.52817965, 12.7, -15.54419618), x_dir=(0, 0, 1), z_dir=(1, 0, 0))) as fillet1_piece_20_section:
        with BuildLine():
            CenterArc((FILLET1_R, FILLET1_R), FILLET1_R, 180, 90)
            Line((0, FILLET1_R), (0, 0))
            Line((0, 0), (FILLET1_R, 0))
        make_face()
    fillet1_piece_20 = extrude(amount=12, mode=Mode.PRIVATE)
    fillet1_piece_20 = split(fillet1_piece_20, bisect_by=Plane(origin=(-21.57817965, 12.360407329, -15.204603509), z_dir=(1, 0, 0)), keep=Keep.TOP, mode=Mode.PRIVATE)
    add(fillet1_piece_20, mode=Mode.SUBTRACT)
    with BuildSketch(Plane(origin=(-25.32817965, 12.7, -15.54419618), x_dir=(0, -1, 0), z_dir=(1, 0, 0))) as fillet1_piece_21_section:
        with BuildLine():
            CenterArc((FILLET1_R, -FILLET1_R), FILLET1_R, 90, 90)
            Line((0, -FILLET1_R), (0, 0))
            Line((0, 0), (FILLET1_R, 0))
        make_face()
    fillet1_piece_21 = extrude(amount=5.25, mode=Mode.PRIVATE)
    fillet1_piece_21 = split(fillet1_piece_21, bisect_by=Plane(origin=(-24.27817965, 12.360407329, -15.204603509), z_dir=(-1, 0, 0)), keep=Keep.TOP, mode=Mode.PRIVATE)
    add(fillet1_piece_21, mode=Mode.SUBTRACT)
    with BuildSketch(Plane(origin=(-21.57817965, 12.7, -15.54419618), x_dir=(0, -1, 0), z_dir=(1, 0, 0))) as fillet1_piece_22:
        with BuildLine():
            CenterArc((FILLET1_R, -FILLET1_R), FILLET1_R, 90, 90)
            Line((0, -FILLET1_R), (0, 0))
            Line((0, 0), (FILLET1_R, 0))
        make_face()
    extrude(amount=1.5, mode=Mode.SUBTRACT)
    with BuildSketch(Plane(origin=(-18.57817965, 12.7, -14.04419618), x_dir=(0, -1, 0), z_dir=(0, 0, 1))) as fillet1_piece_23:
        with BuildLine():
            CenterArc((FILLET1_R, -FILLET1_R), FILLET1_R, 90, 90)
            Line((0, -FILLET1_R), (0, 0))
            Line((0, 0), (FILLET1_R, 0))
        make_face()
    extrude(amount=31, mode=Mode.SUBTRACT)
    with BuildSketch(Plane(origin=(-29.960550109, 0, -2.405234518), x_dir=(0, 0.5735764363510496, -0.8191520442889895), z_dir=(1, 0, 0))) as fillet1_piece_24:
        with BuildLine():
            CenterArc((FILLET1_R * 0.315298788879, FILLET1_R), FILLET1_R, 235, 35)
            Line((-FILLET1_R * 0.258277647472, FILLET1_R * 0.180847955711), (0, 0))
            Line((0, 0), (FILLET1_R * 0.315298788879, 0))
        make_face()
    extrude(amount=5.682370458, mode=Mode.SUBTRACT)
    with BuildSketch(Plane(origin=(-30.73030609, 9.2, -15.54419618), x_dir=(0, 1, 0), z_dir=(1, 0, 0))) as fillet1_piece_25:
        with BuildLine():
            CenterArc((FILLET1_R * 0.520567050552, FILLET1_R), FILLET1_R, 215, 55)
            Line((-FILLET1_R * 0.298584993737, FILLET1_R * 0.426423563649), (0, 0))
            Line((0, 0), (FILLET1_R * 0.520567050552, 0))
        make_face()
    extrude(amount=6.45212644, mode=Mode.SUBTRACT)

    # Fillet2
    fillet2_edges = [part.edges().sort_by_distance(p)[0] for p in [
        (-22.17817965, 3, -9.54419618),
        (-22.17817965, 2.25, 4.45580382),
        (-22.92817965, 3, -23.54419618),
        (-22.17817965, 2.25, -23.54419618),
        (-23.67817965, 3, -9.54419618),
        (-23.67817965, 2.25, -23.54419618),
        (-22.92817965, 3, 4.45580382),
        (-23.67817965, 2.25, 4.45580382),
        (-23.67817965, 0, -12.224715349),
        (-22.17817965, 0, -12.224715349),
        (-23.67817965, 0.439339828, -23.104856352),
        (-23.67817965, 1.246347032, 4.434201659),
        (-22.17817965, 0.439339828, -23.104856352),
        (-22.17817965, 1.246347032, 4.434201659),
    ]]
    fillet(fillet2_edges, radius=FILLET2_R)


solid = part.part
